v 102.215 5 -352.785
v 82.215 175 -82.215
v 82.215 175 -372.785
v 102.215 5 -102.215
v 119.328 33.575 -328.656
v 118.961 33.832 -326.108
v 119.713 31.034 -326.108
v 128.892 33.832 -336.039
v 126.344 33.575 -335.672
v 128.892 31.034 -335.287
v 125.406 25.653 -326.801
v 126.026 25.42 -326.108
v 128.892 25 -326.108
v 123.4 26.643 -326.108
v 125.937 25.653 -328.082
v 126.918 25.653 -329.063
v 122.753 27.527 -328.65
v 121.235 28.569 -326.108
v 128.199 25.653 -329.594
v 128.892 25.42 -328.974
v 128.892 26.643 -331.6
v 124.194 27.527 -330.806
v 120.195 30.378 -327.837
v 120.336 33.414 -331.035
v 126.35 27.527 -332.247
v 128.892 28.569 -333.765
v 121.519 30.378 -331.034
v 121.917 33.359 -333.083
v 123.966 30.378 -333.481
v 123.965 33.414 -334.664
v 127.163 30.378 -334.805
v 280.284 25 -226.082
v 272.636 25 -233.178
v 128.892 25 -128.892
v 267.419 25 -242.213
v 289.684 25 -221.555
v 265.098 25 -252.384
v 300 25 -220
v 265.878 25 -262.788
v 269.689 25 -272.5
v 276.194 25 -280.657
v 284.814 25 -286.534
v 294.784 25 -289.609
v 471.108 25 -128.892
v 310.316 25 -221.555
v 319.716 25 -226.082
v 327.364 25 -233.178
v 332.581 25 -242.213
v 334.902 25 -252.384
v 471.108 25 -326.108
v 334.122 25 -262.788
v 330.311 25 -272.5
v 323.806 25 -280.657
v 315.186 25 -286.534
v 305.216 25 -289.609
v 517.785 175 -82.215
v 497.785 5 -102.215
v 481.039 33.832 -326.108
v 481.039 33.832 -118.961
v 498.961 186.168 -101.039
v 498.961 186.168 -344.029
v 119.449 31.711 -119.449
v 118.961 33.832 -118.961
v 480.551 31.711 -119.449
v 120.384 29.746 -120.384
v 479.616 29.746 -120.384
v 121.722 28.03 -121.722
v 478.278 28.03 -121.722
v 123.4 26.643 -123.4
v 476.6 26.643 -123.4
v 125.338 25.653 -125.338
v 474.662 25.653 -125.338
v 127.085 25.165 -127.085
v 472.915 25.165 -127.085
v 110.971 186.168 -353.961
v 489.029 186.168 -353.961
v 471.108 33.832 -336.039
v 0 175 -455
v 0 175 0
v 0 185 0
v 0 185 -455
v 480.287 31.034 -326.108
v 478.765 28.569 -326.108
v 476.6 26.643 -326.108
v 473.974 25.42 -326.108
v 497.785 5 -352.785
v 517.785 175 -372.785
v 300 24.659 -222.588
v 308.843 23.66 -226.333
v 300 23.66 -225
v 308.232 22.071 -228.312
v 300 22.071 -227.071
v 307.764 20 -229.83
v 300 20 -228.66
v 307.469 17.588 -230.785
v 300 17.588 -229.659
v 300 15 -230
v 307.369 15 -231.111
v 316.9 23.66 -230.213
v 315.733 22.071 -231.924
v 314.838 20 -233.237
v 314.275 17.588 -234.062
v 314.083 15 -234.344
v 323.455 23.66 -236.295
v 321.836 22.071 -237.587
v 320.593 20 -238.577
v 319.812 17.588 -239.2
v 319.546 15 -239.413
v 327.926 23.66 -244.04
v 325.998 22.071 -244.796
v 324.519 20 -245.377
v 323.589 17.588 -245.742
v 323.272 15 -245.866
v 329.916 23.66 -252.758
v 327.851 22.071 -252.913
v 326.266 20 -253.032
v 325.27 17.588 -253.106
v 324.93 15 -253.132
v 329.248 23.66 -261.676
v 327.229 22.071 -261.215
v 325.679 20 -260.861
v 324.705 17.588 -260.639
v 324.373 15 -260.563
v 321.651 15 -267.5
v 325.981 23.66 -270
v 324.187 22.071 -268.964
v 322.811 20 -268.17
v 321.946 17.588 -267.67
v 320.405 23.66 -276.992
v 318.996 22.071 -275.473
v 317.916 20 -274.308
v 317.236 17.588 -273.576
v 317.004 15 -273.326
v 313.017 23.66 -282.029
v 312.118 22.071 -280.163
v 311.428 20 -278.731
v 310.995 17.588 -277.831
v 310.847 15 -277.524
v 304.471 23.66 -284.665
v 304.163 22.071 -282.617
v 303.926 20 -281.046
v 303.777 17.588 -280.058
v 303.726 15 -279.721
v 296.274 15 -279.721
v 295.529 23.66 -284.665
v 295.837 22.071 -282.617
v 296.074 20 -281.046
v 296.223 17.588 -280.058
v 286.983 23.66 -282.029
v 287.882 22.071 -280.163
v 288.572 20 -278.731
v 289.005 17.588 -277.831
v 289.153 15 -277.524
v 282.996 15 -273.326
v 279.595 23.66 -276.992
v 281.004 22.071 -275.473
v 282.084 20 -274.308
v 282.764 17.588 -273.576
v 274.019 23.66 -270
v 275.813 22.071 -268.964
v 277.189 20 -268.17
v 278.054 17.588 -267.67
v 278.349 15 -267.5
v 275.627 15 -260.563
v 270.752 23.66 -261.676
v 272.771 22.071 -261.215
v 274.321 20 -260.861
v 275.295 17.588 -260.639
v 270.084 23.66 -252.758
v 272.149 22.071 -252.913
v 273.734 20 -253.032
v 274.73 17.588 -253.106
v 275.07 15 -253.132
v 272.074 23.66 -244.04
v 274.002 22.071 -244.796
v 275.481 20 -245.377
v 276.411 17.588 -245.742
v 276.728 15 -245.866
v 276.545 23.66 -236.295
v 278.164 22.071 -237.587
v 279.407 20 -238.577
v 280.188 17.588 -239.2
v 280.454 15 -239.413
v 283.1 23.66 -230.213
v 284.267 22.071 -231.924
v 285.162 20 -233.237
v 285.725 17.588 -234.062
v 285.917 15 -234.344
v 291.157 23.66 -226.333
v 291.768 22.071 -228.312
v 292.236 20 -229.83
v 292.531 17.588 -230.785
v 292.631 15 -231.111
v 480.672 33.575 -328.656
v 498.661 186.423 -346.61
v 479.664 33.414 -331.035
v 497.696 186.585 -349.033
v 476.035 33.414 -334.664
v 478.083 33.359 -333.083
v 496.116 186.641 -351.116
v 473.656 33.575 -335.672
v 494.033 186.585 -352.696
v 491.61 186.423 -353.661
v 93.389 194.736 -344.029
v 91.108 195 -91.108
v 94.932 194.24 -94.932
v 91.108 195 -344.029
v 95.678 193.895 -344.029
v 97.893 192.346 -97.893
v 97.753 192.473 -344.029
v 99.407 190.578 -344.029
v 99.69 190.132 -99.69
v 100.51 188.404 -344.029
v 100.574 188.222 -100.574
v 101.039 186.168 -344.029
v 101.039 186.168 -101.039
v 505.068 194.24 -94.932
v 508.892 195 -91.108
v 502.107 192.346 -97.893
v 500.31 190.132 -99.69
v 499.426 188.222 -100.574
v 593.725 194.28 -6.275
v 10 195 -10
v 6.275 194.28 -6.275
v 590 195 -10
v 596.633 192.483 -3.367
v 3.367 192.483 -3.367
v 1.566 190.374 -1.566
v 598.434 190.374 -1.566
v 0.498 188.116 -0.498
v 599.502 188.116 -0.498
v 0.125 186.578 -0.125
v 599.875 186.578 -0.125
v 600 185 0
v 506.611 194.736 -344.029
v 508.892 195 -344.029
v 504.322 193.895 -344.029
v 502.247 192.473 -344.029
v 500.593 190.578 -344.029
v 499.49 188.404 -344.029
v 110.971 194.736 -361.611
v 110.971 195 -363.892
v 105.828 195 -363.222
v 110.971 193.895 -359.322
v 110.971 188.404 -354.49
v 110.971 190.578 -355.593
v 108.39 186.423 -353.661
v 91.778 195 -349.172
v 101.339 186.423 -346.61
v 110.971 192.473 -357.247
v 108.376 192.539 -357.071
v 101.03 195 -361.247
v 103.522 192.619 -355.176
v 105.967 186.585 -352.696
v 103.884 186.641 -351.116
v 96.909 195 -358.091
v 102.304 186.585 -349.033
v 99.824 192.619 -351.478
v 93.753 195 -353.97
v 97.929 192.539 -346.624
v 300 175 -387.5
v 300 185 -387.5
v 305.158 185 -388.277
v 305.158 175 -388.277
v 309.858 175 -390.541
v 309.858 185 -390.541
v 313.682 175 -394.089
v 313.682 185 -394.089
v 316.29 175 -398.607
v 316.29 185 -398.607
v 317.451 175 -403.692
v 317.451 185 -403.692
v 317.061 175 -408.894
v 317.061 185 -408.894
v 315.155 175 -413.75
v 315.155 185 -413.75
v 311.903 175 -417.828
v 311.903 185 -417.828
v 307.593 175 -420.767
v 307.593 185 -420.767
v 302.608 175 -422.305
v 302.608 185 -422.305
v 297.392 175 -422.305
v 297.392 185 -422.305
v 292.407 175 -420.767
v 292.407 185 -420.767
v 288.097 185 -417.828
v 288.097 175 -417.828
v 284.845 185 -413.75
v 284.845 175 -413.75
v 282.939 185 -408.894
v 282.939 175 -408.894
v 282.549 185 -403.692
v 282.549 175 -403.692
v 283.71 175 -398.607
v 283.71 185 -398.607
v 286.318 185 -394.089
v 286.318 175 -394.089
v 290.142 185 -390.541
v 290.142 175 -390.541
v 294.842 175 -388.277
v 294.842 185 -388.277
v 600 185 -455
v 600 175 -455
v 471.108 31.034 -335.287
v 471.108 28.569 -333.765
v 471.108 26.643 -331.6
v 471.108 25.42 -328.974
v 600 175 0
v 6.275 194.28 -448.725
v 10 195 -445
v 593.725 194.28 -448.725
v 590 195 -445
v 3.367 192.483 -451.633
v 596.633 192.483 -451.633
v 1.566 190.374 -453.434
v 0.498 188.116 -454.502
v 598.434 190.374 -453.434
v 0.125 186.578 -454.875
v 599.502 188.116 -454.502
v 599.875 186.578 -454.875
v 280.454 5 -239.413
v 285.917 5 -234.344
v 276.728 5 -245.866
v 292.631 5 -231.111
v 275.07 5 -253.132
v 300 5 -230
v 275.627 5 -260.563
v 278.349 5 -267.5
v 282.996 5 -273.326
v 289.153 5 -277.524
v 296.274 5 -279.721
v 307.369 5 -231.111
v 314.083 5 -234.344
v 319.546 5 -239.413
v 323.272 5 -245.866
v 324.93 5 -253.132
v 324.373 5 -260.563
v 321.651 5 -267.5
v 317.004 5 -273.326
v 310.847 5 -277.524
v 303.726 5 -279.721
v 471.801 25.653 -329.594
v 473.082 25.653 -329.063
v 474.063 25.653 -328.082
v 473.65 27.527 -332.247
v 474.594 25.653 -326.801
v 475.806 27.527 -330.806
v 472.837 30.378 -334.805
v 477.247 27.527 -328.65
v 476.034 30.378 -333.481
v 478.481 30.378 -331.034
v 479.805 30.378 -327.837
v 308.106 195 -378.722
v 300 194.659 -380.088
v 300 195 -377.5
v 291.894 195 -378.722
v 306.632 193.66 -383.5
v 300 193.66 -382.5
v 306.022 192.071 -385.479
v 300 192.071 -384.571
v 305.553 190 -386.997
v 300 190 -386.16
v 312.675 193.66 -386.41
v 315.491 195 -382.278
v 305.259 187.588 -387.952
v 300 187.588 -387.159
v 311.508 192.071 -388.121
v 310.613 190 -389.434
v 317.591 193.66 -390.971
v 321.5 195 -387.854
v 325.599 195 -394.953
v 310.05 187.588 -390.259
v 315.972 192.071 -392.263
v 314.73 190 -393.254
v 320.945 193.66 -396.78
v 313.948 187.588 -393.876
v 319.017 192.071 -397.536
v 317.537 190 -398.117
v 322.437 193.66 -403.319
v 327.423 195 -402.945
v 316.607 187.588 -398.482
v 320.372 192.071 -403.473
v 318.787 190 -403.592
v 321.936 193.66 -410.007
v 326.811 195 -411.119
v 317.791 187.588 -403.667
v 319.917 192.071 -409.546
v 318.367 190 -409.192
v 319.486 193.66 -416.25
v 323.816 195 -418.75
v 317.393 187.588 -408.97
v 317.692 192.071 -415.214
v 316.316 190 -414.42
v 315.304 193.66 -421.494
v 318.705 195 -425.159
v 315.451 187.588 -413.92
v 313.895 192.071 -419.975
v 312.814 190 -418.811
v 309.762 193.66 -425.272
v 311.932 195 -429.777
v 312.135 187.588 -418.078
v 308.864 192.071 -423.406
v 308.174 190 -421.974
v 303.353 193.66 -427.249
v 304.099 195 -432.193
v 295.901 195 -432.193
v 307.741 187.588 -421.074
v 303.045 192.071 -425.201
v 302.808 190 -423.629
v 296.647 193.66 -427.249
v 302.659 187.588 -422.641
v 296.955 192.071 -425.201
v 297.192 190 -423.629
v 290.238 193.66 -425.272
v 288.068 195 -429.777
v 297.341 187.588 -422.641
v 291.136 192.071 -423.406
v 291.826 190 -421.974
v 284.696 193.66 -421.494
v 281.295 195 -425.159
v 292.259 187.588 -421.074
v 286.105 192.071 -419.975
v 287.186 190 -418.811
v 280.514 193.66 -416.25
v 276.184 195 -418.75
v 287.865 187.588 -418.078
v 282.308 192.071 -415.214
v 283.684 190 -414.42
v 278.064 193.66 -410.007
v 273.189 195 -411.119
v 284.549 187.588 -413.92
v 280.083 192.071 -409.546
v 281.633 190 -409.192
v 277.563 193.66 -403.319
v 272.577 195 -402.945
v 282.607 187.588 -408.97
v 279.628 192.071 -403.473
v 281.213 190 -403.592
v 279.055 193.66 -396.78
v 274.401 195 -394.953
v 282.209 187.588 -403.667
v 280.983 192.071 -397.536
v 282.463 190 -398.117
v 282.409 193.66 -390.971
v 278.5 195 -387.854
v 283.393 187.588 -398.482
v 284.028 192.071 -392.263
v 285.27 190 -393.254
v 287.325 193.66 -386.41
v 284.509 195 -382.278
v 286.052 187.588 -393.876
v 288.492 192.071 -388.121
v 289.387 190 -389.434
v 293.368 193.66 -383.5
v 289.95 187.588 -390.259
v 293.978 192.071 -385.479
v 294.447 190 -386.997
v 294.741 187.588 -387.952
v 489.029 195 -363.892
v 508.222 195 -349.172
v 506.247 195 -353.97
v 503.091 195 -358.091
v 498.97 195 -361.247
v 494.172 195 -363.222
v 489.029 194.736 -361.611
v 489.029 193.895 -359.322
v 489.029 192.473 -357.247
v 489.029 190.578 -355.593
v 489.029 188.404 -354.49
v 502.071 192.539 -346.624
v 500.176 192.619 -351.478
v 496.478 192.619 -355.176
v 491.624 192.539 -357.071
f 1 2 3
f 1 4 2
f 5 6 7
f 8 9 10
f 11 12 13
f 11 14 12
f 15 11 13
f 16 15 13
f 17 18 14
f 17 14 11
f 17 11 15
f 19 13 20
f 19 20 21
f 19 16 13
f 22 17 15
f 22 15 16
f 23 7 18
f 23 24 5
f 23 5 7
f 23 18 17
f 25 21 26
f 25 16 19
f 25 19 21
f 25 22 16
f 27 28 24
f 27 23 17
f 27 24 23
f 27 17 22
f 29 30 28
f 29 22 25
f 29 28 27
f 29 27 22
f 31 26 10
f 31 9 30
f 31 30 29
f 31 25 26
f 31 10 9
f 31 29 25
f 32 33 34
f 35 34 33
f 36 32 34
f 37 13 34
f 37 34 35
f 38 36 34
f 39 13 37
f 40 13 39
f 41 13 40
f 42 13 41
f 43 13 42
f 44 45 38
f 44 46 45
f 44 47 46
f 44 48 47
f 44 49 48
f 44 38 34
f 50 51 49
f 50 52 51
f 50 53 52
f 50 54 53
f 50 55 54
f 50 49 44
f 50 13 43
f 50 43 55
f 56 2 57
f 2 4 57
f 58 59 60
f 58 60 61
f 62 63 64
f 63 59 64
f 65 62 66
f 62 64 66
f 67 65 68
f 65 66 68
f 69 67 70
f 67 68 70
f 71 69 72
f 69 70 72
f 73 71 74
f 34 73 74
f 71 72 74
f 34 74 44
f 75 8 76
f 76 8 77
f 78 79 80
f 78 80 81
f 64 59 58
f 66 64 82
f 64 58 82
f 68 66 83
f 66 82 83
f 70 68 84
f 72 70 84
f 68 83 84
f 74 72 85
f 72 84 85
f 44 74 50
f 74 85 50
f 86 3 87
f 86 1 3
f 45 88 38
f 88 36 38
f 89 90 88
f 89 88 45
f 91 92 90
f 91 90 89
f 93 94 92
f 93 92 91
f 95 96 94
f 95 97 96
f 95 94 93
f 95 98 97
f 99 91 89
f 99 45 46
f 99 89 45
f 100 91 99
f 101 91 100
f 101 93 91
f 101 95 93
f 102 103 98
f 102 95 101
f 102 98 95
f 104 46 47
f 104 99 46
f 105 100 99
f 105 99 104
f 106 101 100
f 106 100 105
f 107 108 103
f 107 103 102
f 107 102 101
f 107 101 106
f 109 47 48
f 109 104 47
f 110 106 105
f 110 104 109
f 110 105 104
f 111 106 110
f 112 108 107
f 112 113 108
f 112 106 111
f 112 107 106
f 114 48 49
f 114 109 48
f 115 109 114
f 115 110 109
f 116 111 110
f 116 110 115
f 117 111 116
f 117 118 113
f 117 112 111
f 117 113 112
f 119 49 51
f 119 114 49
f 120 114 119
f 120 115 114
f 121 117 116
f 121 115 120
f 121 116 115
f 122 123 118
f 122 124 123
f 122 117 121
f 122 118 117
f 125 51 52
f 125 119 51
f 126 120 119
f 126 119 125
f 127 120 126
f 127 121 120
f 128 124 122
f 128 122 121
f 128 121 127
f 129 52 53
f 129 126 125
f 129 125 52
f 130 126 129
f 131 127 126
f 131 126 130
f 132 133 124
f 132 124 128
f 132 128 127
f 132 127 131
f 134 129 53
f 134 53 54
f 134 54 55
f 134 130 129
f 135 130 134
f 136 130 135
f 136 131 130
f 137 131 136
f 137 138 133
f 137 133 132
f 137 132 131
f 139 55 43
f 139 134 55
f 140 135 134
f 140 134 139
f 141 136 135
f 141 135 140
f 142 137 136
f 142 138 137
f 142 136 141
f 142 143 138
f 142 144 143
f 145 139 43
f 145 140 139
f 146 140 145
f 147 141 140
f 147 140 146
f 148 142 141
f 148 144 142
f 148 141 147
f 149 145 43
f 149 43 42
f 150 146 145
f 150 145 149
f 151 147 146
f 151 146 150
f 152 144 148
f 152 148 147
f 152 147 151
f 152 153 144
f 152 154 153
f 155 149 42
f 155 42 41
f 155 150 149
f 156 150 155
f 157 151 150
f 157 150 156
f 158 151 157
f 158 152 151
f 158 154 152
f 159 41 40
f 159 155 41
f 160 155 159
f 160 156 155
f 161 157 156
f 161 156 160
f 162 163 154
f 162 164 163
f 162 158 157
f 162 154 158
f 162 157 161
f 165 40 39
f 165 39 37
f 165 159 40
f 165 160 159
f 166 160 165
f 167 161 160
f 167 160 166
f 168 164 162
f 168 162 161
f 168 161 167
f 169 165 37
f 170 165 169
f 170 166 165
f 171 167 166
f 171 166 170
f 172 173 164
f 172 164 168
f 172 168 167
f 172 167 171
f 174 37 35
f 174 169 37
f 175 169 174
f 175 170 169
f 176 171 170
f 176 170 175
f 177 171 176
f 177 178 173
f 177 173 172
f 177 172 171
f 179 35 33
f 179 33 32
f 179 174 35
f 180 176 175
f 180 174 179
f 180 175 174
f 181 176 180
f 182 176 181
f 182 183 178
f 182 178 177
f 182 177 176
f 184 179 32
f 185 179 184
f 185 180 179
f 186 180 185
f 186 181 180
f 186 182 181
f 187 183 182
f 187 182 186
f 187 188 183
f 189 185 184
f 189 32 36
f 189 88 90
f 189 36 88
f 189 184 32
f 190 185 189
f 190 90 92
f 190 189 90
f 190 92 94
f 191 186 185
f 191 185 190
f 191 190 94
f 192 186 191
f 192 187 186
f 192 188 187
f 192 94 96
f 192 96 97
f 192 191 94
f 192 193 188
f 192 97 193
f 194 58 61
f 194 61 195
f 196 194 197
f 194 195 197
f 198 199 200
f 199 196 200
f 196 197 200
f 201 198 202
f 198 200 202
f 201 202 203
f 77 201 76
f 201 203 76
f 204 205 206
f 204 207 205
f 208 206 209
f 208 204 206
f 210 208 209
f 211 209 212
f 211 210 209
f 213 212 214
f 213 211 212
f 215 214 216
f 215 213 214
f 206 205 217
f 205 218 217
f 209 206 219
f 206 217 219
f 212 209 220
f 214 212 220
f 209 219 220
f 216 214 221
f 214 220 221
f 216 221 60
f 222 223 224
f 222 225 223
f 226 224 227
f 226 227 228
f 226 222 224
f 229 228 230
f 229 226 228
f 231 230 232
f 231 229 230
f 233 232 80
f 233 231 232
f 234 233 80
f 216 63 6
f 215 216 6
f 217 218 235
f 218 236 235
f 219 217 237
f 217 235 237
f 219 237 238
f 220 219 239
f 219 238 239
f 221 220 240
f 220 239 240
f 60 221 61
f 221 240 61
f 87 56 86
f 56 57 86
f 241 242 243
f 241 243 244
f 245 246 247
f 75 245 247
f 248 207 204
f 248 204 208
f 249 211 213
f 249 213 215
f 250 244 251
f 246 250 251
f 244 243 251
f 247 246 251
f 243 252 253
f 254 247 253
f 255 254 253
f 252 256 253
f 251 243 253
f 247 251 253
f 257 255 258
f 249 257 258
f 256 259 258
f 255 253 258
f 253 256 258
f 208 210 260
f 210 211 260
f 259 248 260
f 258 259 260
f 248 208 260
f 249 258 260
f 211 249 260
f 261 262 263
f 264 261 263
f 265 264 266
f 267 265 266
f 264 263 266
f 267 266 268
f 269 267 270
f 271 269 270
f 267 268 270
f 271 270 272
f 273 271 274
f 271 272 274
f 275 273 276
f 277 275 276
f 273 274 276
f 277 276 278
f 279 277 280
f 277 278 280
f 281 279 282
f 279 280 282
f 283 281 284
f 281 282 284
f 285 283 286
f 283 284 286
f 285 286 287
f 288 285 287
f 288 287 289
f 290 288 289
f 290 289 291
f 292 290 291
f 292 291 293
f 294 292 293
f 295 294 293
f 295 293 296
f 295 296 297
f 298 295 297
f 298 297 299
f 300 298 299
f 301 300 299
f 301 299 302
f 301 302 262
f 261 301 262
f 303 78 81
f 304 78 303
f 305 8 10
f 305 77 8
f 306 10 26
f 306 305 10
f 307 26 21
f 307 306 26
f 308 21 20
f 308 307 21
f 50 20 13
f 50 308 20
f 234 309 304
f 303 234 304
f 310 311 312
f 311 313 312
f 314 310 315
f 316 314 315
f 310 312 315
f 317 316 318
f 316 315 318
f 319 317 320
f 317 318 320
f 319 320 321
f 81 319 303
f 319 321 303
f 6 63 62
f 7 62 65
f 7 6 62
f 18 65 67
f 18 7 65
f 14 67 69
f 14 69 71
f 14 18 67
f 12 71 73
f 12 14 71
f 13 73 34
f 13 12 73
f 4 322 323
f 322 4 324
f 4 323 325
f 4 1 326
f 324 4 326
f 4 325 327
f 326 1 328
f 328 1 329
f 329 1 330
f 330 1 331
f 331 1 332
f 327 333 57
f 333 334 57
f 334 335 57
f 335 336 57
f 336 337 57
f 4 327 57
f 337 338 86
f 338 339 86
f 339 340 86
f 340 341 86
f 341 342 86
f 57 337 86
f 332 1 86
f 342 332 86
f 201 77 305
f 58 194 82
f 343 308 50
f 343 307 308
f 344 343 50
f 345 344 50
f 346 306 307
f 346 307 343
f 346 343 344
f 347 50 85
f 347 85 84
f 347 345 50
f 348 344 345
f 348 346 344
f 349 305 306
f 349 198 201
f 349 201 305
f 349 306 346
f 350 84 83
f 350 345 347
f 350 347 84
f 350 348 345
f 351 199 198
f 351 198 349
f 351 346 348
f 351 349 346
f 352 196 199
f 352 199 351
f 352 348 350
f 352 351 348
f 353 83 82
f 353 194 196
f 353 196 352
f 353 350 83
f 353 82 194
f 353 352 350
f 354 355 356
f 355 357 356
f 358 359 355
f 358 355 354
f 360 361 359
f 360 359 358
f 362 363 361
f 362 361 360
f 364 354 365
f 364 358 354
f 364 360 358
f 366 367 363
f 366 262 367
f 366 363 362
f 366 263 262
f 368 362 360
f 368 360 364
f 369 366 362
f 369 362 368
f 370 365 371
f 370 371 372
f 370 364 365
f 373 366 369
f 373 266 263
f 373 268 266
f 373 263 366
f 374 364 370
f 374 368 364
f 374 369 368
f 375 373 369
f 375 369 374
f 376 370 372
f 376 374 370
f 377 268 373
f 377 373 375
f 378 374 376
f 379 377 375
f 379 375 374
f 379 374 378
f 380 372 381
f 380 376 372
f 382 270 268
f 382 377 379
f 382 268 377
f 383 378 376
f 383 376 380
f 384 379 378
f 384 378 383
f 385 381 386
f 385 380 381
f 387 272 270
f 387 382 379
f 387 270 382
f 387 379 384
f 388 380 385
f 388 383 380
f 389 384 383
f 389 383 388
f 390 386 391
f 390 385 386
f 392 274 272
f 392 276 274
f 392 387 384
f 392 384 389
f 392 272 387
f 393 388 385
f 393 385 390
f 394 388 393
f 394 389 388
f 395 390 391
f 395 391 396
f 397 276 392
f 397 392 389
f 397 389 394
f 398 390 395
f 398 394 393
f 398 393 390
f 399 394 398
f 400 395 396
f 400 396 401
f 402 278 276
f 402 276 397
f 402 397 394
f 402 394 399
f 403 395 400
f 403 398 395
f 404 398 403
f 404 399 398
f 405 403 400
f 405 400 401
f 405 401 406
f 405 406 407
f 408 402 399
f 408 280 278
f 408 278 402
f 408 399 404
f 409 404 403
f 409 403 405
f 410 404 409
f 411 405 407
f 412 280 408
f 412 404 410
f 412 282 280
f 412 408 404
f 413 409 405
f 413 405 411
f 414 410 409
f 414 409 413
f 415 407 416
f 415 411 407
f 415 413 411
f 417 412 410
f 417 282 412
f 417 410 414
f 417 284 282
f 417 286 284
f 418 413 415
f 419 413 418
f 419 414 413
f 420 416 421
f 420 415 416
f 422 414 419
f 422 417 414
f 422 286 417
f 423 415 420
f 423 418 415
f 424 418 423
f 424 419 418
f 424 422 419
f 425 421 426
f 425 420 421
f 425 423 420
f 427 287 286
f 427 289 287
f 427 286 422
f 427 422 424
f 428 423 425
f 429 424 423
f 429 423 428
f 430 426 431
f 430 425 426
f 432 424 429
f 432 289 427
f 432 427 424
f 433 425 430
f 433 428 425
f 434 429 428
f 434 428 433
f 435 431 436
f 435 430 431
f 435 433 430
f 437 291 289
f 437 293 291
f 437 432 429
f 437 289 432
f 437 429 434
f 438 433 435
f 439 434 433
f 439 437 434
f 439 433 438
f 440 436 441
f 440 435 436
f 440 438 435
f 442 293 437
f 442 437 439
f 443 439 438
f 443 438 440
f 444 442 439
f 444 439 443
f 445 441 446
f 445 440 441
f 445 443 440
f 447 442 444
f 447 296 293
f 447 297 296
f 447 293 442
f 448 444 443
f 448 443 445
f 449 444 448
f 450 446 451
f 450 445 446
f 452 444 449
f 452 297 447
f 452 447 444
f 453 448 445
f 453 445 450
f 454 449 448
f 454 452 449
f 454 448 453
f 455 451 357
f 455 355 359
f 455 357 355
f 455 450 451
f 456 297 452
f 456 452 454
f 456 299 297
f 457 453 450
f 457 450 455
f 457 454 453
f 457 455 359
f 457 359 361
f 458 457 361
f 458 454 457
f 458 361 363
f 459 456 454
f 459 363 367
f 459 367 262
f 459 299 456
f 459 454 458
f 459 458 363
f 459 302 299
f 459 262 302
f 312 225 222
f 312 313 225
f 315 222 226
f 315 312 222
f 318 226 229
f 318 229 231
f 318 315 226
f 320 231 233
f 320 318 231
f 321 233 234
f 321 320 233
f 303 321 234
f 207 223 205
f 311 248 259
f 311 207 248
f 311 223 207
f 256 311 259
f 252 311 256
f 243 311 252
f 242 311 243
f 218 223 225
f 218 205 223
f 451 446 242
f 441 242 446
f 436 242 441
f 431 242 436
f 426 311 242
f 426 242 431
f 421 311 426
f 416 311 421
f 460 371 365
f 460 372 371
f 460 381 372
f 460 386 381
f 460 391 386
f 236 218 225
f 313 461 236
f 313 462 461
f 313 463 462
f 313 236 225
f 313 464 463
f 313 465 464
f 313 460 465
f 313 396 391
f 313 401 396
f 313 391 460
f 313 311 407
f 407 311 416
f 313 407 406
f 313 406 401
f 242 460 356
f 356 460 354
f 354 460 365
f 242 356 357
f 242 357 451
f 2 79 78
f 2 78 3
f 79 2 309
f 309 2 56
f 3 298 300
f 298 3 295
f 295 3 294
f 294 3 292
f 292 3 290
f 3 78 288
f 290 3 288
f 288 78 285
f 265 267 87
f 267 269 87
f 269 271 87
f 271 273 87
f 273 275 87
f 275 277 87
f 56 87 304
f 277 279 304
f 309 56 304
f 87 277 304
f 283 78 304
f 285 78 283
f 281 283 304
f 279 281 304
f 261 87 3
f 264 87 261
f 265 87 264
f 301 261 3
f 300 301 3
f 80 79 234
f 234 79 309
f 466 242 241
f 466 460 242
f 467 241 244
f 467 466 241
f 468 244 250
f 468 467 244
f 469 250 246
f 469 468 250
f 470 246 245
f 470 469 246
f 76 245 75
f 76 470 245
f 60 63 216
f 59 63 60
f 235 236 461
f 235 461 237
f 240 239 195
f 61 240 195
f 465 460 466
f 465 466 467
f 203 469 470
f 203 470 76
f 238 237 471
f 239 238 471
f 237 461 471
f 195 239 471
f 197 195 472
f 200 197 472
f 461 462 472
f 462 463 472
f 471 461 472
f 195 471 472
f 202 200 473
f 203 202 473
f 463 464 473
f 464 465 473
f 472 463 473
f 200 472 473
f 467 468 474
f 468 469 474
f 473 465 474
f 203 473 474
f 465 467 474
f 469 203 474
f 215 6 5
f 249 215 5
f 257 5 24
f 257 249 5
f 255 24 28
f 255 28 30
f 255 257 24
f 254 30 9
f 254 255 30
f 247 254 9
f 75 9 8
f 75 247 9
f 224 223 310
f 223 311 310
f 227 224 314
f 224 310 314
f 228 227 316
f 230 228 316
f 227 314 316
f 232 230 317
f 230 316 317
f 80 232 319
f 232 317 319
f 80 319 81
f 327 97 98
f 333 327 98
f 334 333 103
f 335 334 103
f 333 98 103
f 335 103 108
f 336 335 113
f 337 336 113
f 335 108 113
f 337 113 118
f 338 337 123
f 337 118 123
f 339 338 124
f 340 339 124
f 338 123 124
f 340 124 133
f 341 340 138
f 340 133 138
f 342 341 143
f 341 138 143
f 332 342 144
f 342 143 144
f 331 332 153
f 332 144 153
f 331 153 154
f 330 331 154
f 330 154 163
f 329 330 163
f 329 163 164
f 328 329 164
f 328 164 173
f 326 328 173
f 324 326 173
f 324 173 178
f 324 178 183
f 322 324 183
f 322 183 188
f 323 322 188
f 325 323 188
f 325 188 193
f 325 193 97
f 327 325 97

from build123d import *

# Parameters (mm, degrees)
SKETCH_1_W          = 600
SKETCH_1_H          = 455
EXTRUDE_1_DEPTH     = 195
LOFT_1_OUTLINE_W    = 360
LOFT_1_OUTLINE_H    = 215
LOFT_1_DEPTH        = 170
LOFT_1_DRAFT        = -6.7098368
SHELL_1_T           = -20
SKETCH_3_R          = 25
SKETCH_3_R_2        = 17.5
CUT_EXTRUDE_2_DEPTH = 777.61122835
FILLET_1_R          = 10


# Read off the part's stored shape, not the designer's step: Вырез-По сечениям1
with BuildPart() as part:
    # Эскиз1 → Бобышка-Вытянуть1 (new body)
    with BuildSketch(Plane(origin=(0, 0, 0), x_dir=(1, 0, 0), z_dir=(0, 1, 0))):
        with Locations((300, 227.5)):
            Rectangle(SKETCH_1_W, SKETCH_1_H)
    extrude(amount=EXTRUDE_1_DEPTH)


with BuildPart() as loft_1_tool:
    # Вырез-По сечениям1 outline → Вырез-По сечениям1 (with draft: the straight prism first)
    with BuildSketch(Plane(origin=(0, 25, 0), x_dir=(1, 0, 0), z_dir=(0, 1, 0))):
        with Locations((300, 227.5)):
            Rectangle(LOFT_1_OUTLINE_W, LOFT_1_OUTLINE_H)
    extrude(amount=LOFT_1_DEPTH)
    # Вырез-По сечениям1: the draft: its side faces are tilted about the plane it starts from
    loft_1_sides = [loft_1_tool.faces().sort_by_distance(p)[0] for p in [
        (480, 110, -227.5),
        (300, 110, -335),
        (120, 110, -227.5),
        (300, 110, -120),
    ]]
    draft(loft_1_sides, Plane(origin=(0, 25, 0), x_dir=(1, 0, 0), z_dir=(0, 1, 0)), LOFT_1_DRAFT)


with BuildPart() as part_1:
    add(part.part)

    # Вырез-По сечениям1: cut by loft_1_tool
    add(loft_1_tool.part, mode=Mode.SUBTRACT)

    # Оболочка1
    shell_1_openings = [part_1.faces().sort_by_distance(p)[0] for p in [
        (300, 97.5, 0),
        (0, 97.5, -227.5),
        (600, 97.5, -227.5),
        (300, 0, -227.5),
        (300, 97.5, -455),
    ]]
    offset(amount=SHELL_1_T, openings=shell_1_openings, kind=Kind.INTERSECTION)

    # Эскиз3 → Вырез-Вытянуть2 (cut, through all)
    with BuildSketch(Plane(origin=(0, 195, 0), x_dir=(-1, 0, 0), z_dir=(0, 1, 0))):
        with Locations(Location((-300, -255, 0), (0, 0, 90))):
            Circle(SKETCH_3_R)
        with Locations(Location((-300, -405, 0), (0, 0, 90))):
            Circle(SKETCH_3_R_2)
    extrude(amount=-CUT_EXTRUDE_2_DEPTH, mode=Mode.SUBTRACT)

    # Скругление1
    fillet_1_edges = [part_1.edges().sort_by_distance(p)[0] for p in [
        (300, 195, -455),
        (600, 195, -227.5),
        (300, 195, 0),
        (0, 195, -227.5),
        (100.000000023, 195, -227.5),
        (300, 195, -100.000000023),
        (499.999999977, 195, -227.5),
        (300, 195, -422.5),
        (110.000000012, 110, -344.999999988),
        (300, 195, -354.999999977),
        (489.999999988, 110, -344.999999988),
        (300, 25, -120),
        (120, 25, -227.5),
        (300, 25, -335),
        (480, 25, -227.5),
        (300, 25, -280),
    ]]
    fillet(fillet_1_edges, radius=FILLET_1_R)


solid = part_1.part
